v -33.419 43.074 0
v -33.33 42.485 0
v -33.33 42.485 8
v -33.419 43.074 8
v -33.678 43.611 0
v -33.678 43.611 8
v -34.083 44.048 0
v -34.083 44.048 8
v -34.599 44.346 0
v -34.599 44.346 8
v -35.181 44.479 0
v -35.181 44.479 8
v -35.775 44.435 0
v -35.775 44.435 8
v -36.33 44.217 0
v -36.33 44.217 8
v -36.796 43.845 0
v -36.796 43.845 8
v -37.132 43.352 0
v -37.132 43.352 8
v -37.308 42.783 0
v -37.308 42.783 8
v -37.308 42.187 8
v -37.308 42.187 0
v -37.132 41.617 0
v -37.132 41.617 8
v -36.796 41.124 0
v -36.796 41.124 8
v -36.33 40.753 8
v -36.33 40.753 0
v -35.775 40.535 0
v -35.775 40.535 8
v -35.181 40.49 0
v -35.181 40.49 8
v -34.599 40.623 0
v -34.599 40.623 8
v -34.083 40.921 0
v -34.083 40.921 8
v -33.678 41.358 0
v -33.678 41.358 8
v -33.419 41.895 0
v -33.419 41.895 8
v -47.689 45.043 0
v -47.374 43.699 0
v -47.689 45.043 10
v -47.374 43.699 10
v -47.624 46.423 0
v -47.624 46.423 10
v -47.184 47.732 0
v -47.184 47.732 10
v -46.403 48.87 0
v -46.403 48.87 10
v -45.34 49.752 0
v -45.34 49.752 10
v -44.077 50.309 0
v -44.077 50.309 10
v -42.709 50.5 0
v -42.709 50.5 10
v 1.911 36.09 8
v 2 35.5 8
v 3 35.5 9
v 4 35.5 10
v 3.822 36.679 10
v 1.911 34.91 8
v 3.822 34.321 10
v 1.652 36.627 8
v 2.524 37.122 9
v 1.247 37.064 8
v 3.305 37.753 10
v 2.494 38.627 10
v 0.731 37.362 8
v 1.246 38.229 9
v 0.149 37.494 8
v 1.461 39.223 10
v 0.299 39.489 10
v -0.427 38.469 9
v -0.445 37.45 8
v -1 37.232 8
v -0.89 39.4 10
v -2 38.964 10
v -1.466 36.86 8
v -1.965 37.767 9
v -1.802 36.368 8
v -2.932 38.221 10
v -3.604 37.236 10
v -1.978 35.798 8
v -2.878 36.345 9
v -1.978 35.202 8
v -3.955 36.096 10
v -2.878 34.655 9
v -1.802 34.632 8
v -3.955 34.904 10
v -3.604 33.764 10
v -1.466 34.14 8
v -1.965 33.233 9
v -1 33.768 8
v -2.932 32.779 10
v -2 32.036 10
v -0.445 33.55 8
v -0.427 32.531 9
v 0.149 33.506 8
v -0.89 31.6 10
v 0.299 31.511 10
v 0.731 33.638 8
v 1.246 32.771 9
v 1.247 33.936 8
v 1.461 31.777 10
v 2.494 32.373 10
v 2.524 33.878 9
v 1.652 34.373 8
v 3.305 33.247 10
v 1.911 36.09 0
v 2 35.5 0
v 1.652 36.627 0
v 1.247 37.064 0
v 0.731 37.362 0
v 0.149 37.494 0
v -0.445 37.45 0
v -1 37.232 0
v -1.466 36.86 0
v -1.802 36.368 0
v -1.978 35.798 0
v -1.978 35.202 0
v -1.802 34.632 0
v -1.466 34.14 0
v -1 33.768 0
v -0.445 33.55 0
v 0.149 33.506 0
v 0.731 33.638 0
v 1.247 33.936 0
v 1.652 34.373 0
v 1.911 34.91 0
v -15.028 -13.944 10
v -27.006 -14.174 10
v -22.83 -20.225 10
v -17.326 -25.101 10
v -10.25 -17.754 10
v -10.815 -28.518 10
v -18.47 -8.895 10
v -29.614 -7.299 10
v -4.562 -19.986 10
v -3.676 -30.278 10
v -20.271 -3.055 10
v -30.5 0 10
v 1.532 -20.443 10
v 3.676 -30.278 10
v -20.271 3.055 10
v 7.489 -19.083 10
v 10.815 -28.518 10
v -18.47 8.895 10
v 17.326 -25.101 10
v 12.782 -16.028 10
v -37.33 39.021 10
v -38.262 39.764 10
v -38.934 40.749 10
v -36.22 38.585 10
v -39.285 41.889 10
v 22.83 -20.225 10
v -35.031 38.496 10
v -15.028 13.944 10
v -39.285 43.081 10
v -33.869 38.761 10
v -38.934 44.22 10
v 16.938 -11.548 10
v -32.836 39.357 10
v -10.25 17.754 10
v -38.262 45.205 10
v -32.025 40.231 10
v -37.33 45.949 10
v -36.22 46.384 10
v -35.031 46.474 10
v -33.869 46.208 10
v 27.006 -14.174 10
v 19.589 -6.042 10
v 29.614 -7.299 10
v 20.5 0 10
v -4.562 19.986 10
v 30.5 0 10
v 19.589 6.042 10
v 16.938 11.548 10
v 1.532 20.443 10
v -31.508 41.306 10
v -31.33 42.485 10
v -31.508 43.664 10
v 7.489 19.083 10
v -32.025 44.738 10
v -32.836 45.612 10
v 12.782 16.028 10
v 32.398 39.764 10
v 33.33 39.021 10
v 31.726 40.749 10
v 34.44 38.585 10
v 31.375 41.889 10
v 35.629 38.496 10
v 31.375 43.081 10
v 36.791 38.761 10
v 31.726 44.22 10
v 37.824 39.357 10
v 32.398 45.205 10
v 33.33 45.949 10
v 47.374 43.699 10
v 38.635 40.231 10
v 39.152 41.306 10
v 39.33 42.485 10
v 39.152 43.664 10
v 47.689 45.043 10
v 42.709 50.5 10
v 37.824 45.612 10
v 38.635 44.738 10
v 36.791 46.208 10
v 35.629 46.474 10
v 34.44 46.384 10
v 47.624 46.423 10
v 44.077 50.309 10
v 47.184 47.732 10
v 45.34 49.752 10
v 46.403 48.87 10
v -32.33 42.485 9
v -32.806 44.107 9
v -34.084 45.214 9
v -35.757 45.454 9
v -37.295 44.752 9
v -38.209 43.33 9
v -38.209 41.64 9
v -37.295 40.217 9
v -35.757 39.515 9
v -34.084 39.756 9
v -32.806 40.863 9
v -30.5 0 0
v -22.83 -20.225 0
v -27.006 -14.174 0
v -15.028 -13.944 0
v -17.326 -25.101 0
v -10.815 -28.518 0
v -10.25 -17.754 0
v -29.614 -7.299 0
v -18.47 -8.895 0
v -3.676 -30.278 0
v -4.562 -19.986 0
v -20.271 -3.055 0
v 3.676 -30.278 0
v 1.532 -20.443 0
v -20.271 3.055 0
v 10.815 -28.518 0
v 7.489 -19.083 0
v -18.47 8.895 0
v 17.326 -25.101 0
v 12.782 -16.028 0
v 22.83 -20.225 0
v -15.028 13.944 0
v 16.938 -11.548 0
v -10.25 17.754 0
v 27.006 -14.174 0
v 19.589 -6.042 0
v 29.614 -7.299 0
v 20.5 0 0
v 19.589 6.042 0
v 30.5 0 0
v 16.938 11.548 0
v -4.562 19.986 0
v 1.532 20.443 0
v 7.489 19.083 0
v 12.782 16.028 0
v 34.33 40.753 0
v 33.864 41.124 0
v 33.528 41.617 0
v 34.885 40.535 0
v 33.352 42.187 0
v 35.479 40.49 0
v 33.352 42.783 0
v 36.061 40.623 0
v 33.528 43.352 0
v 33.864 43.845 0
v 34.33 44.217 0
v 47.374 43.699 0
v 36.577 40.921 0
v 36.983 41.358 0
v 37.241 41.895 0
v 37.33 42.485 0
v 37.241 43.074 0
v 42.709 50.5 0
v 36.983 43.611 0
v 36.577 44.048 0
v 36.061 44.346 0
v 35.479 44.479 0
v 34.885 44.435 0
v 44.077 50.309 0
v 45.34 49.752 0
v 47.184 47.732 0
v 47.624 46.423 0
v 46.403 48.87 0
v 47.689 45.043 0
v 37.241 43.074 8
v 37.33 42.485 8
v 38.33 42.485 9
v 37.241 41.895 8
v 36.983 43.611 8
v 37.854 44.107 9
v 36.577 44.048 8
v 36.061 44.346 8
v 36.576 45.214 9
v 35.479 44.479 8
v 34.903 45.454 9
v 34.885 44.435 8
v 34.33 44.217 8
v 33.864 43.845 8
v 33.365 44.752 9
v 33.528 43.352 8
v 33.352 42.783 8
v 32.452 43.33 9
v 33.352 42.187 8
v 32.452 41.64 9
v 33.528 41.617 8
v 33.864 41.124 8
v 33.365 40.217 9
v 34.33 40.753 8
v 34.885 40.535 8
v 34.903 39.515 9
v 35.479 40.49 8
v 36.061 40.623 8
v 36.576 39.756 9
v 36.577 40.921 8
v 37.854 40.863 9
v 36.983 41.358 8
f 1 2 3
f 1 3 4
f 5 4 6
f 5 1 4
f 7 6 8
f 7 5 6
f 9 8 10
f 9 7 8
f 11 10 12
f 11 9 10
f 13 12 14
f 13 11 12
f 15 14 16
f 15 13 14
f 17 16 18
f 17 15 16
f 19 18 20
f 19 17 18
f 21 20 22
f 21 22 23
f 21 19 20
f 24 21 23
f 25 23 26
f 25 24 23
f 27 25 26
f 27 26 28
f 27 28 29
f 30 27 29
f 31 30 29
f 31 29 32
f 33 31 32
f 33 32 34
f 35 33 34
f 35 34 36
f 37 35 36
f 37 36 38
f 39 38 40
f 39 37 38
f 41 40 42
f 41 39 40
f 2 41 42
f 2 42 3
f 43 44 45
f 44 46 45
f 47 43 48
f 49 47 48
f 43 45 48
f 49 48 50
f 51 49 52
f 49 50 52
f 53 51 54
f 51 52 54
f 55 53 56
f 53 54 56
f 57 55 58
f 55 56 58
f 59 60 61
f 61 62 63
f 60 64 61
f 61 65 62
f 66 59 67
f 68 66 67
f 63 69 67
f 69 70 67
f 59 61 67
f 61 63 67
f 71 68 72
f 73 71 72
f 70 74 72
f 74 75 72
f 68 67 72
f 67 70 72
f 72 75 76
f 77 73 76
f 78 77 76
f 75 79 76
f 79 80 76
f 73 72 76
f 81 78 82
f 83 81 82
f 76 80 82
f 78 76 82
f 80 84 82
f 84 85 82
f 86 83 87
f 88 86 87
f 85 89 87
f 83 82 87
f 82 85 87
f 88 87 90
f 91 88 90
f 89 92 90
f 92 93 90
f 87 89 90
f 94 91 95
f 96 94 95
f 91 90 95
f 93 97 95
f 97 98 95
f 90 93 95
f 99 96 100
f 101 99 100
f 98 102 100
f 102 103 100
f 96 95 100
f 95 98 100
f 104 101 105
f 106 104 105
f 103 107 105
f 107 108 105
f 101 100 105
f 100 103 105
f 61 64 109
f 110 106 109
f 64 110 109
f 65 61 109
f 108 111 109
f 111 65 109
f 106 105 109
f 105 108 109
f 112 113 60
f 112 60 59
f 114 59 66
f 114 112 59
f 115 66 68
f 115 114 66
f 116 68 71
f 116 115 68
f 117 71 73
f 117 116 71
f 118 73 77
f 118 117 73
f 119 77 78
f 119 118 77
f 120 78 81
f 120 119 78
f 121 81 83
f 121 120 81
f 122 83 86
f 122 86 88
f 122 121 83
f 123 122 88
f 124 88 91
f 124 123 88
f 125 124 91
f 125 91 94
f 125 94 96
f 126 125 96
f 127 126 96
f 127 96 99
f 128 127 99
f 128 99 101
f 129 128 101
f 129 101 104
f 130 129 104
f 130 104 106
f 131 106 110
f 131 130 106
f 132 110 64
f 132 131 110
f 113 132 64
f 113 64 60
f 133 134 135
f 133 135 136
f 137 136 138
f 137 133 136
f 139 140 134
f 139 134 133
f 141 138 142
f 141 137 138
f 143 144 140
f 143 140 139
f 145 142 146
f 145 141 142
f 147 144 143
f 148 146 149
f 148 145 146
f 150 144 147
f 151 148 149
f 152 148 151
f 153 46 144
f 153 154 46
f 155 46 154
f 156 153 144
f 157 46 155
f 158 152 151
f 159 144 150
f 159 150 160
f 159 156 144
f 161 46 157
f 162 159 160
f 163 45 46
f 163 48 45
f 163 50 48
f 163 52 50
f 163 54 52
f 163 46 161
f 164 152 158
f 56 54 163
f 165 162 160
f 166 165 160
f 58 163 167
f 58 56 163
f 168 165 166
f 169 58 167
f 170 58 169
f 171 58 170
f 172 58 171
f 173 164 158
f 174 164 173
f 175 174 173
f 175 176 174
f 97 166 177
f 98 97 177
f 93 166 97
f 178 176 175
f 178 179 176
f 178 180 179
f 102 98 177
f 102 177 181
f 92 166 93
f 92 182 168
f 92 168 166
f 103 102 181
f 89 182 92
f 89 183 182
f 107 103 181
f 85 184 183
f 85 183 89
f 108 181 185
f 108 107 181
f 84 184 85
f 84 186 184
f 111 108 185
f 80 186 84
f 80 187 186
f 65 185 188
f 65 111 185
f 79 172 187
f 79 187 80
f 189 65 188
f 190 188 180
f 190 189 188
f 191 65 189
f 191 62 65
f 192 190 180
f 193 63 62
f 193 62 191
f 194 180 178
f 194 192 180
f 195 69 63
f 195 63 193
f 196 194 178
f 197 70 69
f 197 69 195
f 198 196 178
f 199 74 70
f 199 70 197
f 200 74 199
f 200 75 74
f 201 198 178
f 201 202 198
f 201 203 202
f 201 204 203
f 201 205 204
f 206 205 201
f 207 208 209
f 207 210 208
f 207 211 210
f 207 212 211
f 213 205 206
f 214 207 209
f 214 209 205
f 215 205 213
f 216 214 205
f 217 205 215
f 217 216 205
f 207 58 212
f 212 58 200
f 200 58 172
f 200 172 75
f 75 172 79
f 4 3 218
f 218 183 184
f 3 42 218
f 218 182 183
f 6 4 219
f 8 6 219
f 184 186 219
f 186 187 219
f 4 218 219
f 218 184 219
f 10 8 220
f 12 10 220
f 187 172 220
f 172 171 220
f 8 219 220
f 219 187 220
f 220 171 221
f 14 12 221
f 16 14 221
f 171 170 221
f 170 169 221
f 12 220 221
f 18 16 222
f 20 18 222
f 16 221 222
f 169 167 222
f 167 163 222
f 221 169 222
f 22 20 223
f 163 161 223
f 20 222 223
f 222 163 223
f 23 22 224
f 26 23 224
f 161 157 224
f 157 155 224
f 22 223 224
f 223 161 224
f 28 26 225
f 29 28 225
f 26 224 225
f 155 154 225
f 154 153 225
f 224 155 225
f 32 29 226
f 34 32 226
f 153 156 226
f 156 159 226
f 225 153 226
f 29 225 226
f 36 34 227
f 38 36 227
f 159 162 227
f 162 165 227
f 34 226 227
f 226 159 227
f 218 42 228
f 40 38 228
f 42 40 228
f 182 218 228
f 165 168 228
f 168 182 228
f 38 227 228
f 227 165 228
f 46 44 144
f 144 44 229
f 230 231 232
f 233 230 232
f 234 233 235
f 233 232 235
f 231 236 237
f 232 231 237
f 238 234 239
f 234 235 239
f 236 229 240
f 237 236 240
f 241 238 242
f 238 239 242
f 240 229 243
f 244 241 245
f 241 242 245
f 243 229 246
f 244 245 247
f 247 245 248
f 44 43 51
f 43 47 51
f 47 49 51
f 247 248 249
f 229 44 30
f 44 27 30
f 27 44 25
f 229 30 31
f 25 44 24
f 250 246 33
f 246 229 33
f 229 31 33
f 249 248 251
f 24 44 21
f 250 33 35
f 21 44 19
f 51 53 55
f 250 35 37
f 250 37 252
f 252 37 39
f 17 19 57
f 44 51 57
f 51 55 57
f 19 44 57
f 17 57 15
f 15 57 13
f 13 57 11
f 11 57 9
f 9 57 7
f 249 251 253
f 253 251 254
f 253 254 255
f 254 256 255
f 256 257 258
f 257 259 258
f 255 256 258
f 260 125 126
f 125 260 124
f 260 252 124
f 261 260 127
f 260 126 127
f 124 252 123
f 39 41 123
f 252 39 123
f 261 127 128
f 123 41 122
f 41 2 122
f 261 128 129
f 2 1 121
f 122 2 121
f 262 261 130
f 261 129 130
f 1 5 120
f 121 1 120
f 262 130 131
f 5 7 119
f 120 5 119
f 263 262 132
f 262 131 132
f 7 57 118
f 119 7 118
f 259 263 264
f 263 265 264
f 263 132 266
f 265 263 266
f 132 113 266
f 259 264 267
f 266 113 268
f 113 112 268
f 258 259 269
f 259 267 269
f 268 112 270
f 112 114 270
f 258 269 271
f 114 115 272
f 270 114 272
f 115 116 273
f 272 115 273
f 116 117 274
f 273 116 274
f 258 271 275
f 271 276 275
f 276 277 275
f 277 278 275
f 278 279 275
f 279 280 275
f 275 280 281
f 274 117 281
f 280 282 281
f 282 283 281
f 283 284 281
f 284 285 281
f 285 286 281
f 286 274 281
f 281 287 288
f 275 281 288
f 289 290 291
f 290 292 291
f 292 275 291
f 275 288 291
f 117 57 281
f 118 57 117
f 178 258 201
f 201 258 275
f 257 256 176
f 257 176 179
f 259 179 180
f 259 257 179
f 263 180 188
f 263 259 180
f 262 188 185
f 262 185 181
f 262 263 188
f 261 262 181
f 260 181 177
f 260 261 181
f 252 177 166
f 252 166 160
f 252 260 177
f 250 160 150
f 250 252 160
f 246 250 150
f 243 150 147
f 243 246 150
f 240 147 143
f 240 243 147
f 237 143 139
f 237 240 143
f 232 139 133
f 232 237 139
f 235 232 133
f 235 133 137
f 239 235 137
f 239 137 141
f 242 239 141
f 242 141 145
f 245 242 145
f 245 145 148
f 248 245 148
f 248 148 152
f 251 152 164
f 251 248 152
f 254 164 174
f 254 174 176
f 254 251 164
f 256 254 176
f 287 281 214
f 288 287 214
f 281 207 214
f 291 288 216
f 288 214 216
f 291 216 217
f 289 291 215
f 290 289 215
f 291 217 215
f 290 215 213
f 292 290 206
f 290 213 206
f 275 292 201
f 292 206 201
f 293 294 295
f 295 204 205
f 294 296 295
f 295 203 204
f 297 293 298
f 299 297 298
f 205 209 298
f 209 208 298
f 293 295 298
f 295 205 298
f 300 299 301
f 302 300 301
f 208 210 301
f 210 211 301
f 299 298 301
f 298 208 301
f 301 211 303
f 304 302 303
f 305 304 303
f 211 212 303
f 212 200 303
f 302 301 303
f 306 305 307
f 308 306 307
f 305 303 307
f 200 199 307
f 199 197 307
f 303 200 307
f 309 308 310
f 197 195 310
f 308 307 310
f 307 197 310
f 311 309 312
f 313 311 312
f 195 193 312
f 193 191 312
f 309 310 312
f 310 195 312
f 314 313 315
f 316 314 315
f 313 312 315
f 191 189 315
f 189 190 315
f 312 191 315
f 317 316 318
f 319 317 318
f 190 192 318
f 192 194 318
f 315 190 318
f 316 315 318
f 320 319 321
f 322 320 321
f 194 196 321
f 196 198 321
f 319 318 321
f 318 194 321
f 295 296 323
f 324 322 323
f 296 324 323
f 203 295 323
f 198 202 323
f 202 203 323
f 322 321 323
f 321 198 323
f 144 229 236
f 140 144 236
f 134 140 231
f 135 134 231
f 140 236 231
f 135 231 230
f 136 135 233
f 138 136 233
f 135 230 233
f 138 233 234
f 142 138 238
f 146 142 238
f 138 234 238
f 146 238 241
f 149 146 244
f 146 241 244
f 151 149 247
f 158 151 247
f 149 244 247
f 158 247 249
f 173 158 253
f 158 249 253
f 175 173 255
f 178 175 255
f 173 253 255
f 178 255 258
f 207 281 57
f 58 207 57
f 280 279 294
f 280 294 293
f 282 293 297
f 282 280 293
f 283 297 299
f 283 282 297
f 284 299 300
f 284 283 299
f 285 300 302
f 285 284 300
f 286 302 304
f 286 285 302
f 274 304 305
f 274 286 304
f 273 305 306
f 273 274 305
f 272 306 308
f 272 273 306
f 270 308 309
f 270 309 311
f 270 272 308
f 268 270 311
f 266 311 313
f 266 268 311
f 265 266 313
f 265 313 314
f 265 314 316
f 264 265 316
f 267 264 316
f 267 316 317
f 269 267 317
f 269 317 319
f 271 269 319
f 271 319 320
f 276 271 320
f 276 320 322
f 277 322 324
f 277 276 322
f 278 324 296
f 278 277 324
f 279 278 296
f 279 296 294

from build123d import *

# Parameters (mm, degrees)
F0_R     = 20.5
F0_R_2   = 2
F1_DEPTH = 10
F2_SIZE  = 2
F3_R     = 5


with BuildPart() as f1:
    # F0 (on Top) → F1 (new body)
    with BuildSketch(Plane.XY):
        with BuildLine():
            Line((-50, 50.5), (-30.5, 0))
            ThreePointArc((-30.5, 0), (0, -30.5), (30.5, 0))
            Line((30.5, 0), (50, 50.5))
            Line((50, 50.5), (-50, 50.5))
        make_face()
        Circle(F0_R, mode=Mode.SUBTRACT)
        with Locations((-35.330024, 42.484712)):
            Circle(F0_R_2, mode=Mode.SUBTRACT)
        with Locations((0, 35.5)):
            Circle(F0_R_2, mode=Mode.SUBTRACT)
        with Locations((35.330024, 42.484712)):
            Circle(F0_R_2, mode=Mode.SUBTRACT)
    extrude(amount=F1_DEPTH)

    # F2
    f2_edges = [f1.edges().sort_by_distance(p)[0] for p in [
        (-37.330024, 42.484712, 10),
        (-2, 35.5, 10),
        (33.330024, 42.484712, 10),
    ]]
    chamfer(f2_edges, length=F2_SIZE)

    # F3
    f3_edges = [f1.edges().sort_by_distance(p)[0] for p in [
        (50, 50.5, 5),
        (-50, 50.5, 5),
    ]]
    fillet(f3_edges, radius=F3_R)


solid = f1.part
